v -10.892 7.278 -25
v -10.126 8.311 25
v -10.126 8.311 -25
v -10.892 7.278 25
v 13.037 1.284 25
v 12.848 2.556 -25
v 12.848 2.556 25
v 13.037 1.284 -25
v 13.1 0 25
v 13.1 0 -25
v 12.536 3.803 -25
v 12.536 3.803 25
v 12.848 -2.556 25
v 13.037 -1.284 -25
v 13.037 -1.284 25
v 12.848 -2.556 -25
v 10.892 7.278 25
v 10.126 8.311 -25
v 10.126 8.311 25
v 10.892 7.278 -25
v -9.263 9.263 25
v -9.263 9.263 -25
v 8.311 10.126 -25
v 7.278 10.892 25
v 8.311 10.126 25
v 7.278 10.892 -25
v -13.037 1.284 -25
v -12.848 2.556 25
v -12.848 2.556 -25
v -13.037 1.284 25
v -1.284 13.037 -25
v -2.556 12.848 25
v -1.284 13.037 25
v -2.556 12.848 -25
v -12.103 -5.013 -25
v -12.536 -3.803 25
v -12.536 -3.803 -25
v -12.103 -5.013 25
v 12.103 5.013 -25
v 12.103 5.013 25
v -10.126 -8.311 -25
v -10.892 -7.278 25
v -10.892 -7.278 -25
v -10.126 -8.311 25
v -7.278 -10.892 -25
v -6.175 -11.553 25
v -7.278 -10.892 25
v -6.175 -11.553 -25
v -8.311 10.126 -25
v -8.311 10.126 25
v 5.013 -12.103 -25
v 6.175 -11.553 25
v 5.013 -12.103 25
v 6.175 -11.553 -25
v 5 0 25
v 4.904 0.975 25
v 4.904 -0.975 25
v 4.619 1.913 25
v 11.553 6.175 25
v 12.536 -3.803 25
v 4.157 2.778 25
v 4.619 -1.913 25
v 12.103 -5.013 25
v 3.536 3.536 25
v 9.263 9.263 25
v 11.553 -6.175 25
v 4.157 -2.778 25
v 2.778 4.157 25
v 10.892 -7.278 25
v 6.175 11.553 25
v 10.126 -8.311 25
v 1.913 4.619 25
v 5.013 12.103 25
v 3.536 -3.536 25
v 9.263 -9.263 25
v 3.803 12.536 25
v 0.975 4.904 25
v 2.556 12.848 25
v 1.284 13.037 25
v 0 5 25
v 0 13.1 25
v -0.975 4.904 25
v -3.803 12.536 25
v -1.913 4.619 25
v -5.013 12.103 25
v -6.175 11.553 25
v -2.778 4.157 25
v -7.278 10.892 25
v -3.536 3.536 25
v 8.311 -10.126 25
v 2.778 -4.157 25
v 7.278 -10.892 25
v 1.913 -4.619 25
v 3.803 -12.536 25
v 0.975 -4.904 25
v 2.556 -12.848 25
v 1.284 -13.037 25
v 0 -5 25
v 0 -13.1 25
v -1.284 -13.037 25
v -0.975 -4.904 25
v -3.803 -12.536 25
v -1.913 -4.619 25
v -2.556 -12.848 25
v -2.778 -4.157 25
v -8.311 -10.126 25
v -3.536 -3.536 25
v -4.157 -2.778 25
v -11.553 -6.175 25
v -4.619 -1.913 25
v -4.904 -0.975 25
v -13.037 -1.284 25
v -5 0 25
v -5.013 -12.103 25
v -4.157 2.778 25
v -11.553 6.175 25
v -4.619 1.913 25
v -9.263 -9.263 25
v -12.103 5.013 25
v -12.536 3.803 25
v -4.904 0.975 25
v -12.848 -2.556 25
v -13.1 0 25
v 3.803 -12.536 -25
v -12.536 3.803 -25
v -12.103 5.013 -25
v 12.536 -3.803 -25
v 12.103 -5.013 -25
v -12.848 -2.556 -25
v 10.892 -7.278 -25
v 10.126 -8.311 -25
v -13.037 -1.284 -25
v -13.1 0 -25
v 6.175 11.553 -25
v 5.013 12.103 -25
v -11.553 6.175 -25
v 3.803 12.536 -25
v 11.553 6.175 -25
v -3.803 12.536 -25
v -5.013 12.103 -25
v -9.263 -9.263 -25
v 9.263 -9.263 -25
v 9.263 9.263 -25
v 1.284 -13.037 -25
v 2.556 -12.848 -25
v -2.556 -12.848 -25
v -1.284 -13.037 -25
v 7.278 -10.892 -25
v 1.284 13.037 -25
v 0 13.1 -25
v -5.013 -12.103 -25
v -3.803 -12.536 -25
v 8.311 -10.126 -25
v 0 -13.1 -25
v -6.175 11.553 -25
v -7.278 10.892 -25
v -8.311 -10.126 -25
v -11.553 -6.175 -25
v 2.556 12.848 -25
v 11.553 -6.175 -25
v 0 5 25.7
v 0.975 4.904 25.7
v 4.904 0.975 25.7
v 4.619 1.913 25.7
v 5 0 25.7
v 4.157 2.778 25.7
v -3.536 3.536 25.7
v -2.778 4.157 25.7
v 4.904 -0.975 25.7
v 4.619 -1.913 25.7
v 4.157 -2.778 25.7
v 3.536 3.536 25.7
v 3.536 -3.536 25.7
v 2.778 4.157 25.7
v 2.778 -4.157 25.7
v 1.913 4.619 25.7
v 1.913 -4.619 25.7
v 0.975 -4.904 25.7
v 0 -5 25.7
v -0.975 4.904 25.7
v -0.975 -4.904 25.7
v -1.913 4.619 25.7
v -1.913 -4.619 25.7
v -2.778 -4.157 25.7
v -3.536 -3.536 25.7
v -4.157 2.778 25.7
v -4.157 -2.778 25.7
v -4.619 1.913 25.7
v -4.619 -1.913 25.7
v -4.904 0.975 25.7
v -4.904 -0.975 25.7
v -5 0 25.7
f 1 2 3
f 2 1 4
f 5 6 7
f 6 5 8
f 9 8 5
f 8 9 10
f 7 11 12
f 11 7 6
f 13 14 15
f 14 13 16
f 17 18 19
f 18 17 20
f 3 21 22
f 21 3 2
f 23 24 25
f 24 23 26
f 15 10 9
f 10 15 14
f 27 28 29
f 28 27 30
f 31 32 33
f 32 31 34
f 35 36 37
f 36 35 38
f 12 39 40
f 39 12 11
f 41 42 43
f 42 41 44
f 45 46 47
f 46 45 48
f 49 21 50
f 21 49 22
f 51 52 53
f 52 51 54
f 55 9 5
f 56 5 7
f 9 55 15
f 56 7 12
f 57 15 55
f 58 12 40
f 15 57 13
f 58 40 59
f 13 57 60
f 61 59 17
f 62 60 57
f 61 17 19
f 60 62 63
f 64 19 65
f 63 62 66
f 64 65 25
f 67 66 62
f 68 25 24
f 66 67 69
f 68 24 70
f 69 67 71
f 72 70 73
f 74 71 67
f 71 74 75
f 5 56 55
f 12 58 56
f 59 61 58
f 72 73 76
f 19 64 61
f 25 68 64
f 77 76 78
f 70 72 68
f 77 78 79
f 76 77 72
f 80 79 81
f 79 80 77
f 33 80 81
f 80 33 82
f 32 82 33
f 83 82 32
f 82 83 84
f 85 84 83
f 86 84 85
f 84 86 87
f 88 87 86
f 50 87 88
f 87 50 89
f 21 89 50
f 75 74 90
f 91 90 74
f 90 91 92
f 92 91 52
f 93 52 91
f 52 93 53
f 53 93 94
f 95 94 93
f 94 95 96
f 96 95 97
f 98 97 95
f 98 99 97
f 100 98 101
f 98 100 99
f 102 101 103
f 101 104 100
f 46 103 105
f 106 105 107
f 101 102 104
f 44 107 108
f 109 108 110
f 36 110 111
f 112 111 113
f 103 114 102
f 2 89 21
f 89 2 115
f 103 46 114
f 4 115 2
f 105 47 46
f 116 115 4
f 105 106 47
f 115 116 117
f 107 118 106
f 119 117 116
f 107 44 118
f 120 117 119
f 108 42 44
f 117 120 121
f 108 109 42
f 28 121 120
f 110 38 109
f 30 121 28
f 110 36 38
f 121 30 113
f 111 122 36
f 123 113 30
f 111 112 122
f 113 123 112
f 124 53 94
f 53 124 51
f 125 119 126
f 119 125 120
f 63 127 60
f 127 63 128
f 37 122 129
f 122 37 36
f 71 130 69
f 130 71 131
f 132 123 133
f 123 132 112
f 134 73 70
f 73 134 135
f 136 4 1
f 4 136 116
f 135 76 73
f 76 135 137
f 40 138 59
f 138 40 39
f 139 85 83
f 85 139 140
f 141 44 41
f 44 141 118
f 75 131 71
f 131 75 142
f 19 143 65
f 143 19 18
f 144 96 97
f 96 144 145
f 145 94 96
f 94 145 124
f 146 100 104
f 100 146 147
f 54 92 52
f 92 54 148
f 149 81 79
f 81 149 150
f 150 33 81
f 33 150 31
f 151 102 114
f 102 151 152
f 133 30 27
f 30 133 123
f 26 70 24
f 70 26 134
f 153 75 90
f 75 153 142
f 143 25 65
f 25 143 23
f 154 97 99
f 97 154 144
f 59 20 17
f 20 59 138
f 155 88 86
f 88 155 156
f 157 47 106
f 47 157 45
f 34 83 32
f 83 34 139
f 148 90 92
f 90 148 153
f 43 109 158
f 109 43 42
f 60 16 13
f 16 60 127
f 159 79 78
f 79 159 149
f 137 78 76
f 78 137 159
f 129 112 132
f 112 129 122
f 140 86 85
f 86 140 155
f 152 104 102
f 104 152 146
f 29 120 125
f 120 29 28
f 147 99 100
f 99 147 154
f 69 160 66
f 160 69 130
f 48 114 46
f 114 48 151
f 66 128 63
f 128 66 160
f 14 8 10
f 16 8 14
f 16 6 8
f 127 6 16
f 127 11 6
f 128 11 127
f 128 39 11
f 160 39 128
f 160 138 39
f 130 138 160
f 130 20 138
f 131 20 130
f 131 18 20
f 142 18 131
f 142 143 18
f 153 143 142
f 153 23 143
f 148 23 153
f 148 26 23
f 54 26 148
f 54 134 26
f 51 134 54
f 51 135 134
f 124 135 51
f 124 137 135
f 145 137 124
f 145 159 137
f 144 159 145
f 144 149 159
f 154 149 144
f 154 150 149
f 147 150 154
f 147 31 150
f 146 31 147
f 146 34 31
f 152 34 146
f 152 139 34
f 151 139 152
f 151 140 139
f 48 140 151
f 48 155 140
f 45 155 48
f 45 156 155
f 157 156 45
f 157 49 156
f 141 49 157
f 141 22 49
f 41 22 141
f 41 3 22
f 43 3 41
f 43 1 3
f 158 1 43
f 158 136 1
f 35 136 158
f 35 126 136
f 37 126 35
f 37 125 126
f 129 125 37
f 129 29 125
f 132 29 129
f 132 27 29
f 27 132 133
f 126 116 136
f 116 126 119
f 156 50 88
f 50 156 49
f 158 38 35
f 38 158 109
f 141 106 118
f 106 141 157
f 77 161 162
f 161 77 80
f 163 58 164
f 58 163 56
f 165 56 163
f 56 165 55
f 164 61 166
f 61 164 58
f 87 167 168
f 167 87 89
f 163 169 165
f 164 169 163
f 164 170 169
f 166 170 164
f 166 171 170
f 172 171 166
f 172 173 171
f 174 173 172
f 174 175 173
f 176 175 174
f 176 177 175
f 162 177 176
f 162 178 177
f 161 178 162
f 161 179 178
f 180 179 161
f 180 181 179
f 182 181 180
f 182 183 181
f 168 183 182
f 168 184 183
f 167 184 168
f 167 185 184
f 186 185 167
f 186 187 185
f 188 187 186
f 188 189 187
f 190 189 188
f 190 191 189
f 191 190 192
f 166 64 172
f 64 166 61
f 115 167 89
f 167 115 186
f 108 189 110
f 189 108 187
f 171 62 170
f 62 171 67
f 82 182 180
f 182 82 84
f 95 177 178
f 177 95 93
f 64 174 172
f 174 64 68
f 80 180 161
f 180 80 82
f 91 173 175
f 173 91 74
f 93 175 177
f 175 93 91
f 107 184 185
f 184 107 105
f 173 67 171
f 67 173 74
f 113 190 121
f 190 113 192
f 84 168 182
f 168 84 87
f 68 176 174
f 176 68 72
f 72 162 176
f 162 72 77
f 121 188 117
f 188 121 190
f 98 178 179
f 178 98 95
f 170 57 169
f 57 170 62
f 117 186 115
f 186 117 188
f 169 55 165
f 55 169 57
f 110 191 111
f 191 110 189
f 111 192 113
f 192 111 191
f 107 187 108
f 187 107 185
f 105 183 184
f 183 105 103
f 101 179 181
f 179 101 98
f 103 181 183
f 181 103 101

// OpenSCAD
// Parameters
height_mm = 50.0; //[25.0:100.0:0.1]
diameter_mm = 26.2; //[13.1:52.4:0.1]
positive_terminal_diameter_mm = 10.0; //[5.0:20.0:0.1]
positive_terminal_height_mm = 1.5; //[0.75:3.0:0.05]
negative_terminal_diameter_mm = 8.0; //[4.0:16.0:0.1]
negative_terminal_height_mm = 0.3; //[0.15:0.6:0.01]
terminal_overlap_mm = 0.8; //[0.5:2.0:0.1]

// Battery - complete geometry
module battery() {
  // Battery Body
  color("DimGray") {
    translate([0, 0, 0])
      cylinder(h=height_mm, r=diameter_mm/2, center=true, $fn=64);
  }
  
  // Positive Terminal
  color("Silver") {
    translate([0, 0, height_mm/2 + positive_terminal_height_mm/2 - terminal_overlap_mm])
      cylinder(h=positive_terminal_height_mm, r=positive_terminal_diameter_mm/2, center=true, $fn=32);
  }
  
  // Negative Terminal
  color("Silver") {
    translate([0, 0, -height_mm/2 - negative_terminal_height_mm/2 + terminal_overlap_mm])
      cylinder(h=negative_terminal_height_mm, r=negative_terminal_diameter_mm/2, center=true, $fn=32);
  }
}

// Assembly
module assembly() {
  battery();
}

assembly();
